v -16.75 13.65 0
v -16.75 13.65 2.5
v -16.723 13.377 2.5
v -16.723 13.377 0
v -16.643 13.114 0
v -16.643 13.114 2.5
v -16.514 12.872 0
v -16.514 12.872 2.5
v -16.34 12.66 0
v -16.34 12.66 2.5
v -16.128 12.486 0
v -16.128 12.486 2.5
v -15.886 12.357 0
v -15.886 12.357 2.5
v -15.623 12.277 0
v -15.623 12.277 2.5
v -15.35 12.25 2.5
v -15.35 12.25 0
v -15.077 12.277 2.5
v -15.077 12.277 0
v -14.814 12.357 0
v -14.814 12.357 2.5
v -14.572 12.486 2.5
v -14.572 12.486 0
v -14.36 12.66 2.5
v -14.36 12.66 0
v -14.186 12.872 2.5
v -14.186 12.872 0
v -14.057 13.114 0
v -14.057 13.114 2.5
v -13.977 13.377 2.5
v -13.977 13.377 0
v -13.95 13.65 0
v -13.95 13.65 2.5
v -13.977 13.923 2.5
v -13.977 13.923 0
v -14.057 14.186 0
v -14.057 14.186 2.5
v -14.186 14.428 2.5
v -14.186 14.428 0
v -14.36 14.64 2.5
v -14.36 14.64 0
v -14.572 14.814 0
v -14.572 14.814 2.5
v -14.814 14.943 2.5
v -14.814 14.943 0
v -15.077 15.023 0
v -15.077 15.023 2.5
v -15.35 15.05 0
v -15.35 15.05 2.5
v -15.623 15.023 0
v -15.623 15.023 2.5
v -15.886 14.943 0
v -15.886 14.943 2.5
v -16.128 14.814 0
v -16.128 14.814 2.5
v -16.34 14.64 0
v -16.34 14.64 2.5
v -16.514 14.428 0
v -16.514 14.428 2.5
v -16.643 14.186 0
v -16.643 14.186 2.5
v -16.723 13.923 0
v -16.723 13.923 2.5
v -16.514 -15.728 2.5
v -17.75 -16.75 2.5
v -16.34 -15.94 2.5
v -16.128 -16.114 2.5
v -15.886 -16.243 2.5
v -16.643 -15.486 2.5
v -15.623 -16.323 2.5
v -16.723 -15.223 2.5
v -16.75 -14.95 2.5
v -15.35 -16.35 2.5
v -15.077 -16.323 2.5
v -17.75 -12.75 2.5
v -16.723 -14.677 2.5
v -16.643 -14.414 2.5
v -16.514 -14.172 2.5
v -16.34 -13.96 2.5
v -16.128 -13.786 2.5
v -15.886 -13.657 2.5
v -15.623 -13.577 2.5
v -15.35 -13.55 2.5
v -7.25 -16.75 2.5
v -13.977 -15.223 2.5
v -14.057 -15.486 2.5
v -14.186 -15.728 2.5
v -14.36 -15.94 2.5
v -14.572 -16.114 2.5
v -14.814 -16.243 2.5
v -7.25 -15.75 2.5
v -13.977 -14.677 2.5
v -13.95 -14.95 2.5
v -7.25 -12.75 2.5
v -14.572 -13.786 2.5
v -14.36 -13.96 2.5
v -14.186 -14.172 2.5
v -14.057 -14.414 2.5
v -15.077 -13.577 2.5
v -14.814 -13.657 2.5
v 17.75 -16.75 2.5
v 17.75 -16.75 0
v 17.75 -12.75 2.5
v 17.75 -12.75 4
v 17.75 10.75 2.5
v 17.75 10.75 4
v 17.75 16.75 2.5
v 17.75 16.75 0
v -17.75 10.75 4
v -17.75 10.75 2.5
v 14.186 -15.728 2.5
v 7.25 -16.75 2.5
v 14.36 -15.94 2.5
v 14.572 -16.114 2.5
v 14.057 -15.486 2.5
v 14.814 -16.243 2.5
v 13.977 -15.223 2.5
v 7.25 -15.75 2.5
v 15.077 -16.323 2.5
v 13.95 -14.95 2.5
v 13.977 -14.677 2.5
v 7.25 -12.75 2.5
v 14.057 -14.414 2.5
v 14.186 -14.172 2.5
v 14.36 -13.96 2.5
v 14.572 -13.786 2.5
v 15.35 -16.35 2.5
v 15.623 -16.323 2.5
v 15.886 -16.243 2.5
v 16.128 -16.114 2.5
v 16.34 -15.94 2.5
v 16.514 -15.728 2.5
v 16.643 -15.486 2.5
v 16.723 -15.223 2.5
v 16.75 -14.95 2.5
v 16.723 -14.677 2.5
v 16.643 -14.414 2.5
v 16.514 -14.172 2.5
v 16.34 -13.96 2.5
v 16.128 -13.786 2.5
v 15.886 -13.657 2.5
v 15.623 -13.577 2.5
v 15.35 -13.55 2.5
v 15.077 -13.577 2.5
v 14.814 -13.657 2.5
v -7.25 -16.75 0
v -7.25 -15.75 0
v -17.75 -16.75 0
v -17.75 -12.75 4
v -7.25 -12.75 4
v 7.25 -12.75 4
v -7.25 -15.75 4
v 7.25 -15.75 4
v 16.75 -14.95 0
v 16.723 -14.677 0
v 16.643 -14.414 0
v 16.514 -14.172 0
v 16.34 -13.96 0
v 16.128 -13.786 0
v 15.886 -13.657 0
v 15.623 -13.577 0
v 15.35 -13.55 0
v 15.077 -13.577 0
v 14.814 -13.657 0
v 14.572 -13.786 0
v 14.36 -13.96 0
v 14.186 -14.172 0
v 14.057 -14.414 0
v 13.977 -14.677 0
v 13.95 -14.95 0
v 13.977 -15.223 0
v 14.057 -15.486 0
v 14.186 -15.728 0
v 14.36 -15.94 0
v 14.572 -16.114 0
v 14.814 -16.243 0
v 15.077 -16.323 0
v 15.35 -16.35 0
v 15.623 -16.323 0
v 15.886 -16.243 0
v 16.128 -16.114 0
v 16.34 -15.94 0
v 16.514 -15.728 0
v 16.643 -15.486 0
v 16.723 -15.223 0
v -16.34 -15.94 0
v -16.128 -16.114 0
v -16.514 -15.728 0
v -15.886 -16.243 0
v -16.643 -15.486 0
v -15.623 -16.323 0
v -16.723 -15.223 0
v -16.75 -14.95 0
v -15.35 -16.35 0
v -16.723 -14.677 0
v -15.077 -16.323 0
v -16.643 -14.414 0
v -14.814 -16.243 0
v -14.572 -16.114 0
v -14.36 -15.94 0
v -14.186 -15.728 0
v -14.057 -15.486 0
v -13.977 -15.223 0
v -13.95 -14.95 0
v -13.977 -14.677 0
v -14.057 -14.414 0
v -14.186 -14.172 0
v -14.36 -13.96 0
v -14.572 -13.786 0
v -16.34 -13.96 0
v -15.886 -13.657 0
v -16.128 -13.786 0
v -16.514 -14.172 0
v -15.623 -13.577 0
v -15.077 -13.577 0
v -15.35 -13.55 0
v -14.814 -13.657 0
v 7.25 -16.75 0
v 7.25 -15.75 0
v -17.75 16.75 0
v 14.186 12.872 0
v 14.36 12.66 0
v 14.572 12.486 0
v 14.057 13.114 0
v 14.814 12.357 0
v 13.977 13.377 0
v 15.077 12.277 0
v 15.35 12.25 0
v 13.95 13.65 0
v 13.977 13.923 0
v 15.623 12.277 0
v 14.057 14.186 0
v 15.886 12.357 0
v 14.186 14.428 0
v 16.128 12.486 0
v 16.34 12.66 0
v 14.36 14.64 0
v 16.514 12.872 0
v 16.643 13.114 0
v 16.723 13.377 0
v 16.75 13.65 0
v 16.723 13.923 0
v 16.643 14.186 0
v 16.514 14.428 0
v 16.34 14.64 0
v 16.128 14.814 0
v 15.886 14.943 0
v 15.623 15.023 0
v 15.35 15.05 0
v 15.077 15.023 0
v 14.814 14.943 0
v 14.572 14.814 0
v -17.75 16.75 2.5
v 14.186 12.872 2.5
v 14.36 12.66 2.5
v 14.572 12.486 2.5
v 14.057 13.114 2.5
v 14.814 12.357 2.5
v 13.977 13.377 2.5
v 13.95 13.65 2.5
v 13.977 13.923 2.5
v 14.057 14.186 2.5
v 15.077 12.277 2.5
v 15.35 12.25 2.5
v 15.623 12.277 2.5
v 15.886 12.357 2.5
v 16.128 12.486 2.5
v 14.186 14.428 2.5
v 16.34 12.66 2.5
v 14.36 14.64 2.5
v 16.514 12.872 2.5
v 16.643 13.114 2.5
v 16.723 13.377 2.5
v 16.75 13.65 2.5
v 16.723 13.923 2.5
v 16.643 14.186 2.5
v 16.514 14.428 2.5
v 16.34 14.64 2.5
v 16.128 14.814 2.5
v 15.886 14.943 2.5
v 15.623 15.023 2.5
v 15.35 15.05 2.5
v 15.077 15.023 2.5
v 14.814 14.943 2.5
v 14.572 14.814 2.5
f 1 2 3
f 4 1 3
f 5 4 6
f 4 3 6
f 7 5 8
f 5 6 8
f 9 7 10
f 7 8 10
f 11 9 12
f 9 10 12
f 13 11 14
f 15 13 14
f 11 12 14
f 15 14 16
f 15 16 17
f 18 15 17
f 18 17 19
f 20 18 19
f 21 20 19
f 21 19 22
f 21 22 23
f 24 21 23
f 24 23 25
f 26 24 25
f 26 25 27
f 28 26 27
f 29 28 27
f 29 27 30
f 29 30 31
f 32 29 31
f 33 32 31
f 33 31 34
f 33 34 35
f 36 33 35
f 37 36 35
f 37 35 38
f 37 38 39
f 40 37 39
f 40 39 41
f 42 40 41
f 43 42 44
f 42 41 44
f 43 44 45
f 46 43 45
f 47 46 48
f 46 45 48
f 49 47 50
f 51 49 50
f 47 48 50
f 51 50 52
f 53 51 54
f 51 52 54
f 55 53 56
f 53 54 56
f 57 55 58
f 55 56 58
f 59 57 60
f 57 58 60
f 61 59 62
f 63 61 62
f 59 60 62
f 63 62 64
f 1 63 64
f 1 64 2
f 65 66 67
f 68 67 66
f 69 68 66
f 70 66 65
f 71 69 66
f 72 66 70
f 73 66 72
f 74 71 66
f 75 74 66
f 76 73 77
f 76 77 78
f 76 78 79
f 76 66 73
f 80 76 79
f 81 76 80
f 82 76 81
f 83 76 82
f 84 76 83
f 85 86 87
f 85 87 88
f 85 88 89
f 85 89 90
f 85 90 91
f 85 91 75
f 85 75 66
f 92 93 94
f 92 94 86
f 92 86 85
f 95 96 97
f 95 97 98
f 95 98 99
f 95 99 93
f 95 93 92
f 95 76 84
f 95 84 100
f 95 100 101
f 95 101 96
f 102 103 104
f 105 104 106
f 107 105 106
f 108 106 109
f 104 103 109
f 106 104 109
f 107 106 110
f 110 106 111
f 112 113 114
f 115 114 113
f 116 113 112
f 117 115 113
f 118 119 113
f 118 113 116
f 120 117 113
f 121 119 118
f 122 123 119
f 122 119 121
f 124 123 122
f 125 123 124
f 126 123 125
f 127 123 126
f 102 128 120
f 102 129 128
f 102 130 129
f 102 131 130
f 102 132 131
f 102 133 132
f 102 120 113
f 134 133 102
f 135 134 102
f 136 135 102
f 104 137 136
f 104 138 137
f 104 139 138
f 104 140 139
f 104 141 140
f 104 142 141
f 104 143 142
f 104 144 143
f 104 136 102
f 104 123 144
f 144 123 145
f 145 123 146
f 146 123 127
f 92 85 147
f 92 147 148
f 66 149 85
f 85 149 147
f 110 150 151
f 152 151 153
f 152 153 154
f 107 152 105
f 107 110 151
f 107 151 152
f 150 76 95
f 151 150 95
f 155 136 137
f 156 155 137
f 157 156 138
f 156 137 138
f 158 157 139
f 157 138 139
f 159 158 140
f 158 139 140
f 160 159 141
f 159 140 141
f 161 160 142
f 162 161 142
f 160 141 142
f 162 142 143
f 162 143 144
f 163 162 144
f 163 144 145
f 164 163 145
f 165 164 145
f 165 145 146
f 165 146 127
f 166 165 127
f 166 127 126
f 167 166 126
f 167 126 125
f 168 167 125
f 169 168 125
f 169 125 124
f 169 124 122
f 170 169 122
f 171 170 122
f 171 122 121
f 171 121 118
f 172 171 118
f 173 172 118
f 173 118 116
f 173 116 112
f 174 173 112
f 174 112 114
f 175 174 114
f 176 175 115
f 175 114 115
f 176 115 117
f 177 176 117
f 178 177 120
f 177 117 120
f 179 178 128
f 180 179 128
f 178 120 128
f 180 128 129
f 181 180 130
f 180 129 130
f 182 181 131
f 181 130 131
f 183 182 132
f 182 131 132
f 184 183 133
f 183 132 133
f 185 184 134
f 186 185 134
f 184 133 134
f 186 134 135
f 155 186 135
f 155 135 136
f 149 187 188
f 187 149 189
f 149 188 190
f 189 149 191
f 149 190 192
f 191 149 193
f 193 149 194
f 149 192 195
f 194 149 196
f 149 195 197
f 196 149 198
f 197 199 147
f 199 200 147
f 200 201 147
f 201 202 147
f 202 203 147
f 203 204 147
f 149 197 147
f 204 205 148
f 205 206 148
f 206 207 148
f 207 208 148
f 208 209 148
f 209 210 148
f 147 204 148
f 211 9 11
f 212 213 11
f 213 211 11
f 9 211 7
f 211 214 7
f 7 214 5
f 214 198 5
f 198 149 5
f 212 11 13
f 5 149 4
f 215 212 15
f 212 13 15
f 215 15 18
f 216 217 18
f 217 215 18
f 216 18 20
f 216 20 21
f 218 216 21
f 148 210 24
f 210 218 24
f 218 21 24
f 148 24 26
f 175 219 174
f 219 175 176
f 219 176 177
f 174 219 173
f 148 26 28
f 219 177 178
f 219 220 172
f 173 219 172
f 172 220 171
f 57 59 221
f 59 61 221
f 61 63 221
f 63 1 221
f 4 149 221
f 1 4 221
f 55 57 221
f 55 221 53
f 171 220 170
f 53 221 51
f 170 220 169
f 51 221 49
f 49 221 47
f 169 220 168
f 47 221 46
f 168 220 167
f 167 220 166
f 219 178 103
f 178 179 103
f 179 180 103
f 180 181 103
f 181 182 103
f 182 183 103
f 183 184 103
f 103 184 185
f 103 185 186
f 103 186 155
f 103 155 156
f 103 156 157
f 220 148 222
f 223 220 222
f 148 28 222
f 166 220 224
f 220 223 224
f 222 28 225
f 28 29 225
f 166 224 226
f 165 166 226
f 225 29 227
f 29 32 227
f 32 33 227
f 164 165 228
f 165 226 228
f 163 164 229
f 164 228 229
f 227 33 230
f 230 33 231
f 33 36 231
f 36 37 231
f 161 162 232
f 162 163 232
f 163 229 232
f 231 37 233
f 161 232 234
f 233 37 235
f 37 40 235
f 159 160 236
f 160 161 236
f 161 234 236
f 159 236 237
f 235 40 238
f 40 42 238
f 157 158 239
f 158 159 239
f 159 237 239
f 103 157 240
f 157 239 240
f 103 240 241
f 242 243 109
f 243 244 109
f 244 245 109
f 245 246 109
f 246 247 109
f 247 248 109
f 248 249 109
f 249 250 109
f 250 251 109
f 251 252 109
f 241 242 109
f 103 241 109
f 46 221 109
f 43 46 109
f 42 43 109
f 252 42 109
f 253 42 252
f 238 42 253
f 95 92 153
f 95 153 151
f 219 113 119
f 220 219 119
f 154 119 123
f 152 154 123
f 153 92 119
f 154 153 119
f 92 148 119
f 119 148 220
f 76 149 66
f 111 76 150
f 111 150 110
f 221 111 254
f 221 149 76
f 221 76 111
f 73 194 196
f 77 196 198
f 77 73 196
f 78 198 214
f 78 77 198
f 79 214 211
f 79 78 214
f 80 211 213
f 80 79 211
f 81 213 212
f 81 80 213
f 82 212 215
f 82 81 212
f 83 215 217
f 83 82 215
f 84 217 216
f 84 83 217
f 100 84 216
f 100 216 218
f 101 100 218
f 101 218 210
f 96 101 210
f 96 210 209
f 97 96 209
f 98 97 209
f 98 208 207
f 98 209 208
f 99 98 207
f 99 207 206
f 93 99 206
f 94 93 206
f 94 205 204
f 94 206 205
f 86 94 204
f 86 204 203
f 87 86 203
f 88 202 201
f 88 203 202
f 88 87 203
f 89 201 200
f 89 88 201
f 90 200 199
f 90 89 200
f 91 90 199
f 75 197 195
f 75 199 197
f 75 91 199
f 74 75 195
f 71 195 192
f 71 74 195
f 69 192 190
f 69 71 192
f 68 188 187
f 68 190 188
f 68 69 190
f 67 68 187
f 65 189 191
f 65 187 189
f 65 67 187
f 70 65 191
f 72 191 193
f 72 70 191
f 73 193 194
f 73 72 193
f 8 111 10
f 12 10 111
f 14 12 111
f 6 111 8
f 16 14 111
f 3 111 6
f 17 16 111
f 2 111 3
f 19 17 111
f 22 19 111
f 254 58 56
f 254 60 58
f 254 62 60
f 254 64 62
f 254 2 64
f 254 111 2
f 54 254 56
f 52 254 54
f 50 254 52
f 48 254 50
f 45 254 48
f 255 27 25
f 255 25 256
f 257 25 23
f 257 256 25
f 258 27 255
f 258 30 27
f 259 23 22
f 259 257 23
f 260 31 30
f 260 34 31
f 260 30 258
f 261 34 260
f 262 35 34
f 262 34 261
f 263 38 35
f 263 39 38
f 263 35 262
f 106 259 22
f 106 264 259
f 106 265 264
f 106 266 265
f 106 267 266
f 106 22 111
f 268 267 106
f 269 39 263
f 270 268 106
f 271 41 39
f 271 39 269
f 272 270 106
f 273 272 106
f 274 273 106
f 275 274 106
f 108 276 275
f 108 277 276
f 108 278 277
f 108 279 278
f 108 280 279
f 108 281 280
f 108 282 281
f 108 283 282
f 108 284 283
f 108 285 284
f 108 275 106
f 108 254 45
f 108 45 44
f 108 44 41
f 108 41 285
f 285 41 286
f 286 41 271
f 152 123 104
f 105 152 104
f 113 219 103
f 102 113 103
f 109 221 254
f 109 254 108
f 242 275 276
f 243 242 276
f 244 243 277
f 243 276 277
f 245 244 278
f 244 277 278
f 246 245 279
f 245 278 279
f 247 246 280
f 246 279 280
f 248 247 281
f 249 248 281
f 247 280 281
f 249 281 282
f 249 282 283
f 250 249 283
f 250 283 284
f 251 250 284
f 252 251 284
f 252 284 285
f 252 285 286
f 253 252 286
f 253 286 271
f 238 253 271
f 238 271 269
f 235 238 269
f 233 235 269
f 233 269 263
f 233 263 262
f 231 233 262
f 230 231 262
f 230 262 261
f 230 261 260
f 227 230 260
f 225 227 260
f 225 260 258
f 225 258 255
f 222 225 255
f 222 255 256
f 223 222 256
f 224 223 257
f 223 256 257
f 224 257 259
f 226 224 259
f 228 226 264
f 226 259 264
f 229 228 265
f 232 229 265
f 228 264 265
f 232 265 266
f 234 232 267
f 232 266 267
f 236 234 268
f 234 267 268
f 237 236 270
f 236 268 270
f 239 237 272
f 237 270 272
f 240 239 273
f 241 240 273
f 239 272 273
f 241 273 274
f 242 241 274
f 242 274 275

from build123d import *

# Parameters (mm, degrees)
SKETCH_1_W             = 35.5
SKETCH_1_H             = 33.5
EXTRUDE_227_DEPTH      = 2.5
SKETCH_3_W             = 14.5
SKETCH_3_H             = 3
EXTRUDE_815_DEPTH      = 1.5
SKETCH_4_W             = 14.5
SKETCH_4_H             = 1
CUT_EXTRUDE_1043_DEPTH = 25.533140851
SKETCH_5_R             = 1.4
CUT_EXTRUDE_2_DEPTH    = 25.533140851
SKETCH_6_R             = 1.4
CUT_EXTRUDE_3_DEPTH    = 25.533140851


with BuildPart() as part:
    # 草图1 → Extrude 227 (new body)
    with BuildSketch(Plane.XY):
        Rectangle(SKETCH_1_W, SKETCH_1_H)
    extrude(amount=EXTRUDE_227_DEPTH)

    # 草图3 → Extrude 815 (add)
    with BuildSketch(Plane.XY.offset(2.5)):
        Polygon((-17.75, 10.75), (-17.75, -12.75), (-7.25, -12.75), (7.25, -12.75), (17.75, -12.75), (17.75, 10.75), align=None)
        with Locations((0, -14.25)):
            Rectangle(SKETCH_3_W, SKETCH_3_H)
    extrude(amount=EXTRUDE_815_DEPTH)

    # 草图4 → Cut-Extrude 1043 (cut, through all)
    with BuildSketch(Plane.XY.offset(2.5)):
        with Locations((0, -16.25)):
            Rectangle(SKETCH_4_W, SKETCH_4_H)
    extrude(amount=-CUT_EXTRUDE_1043_DEPTH, mode=Mode.SUBTRACT)

    # 草图5 → 切除-拉伸2 (cut, through all)
    with BuildSketch(Plane.XY.offset(2.5)):
        with Locations((15.35, 13.65)):
            Circle(SKETCH_5_R)
        with Locations(Location((-15.35, 13.65, 0), (0, 0, 180))):
            Circle(SKETCH_5_R)
    extrude(amount=-CUT_EXTRUDE_2_DEPTH, mode=Mode.SUBTRACT)

    # 草图6 → 切除-拉伸3 (cut, through all)
    with BuildSketch(Plane.XY.offset(2.5)):
        with Locations((15.35, -14.95)):
            Circle(SKETCH_6_R)
    cut_extrude_3 = extrude(amount=-CUT_EXTRUDE_3_DEPTH, mode=Mode.SUBTRACT)

    # 镜向1: 切除-拉伸3 across plane
    add(cut_extrude_3.mirror(Plane(origin=(0, 0, 0), x_dir=(0, 0, 1), z_dir=(1, 0, 0))), mode=Mode.SUBTRACT)


solid = part.part
